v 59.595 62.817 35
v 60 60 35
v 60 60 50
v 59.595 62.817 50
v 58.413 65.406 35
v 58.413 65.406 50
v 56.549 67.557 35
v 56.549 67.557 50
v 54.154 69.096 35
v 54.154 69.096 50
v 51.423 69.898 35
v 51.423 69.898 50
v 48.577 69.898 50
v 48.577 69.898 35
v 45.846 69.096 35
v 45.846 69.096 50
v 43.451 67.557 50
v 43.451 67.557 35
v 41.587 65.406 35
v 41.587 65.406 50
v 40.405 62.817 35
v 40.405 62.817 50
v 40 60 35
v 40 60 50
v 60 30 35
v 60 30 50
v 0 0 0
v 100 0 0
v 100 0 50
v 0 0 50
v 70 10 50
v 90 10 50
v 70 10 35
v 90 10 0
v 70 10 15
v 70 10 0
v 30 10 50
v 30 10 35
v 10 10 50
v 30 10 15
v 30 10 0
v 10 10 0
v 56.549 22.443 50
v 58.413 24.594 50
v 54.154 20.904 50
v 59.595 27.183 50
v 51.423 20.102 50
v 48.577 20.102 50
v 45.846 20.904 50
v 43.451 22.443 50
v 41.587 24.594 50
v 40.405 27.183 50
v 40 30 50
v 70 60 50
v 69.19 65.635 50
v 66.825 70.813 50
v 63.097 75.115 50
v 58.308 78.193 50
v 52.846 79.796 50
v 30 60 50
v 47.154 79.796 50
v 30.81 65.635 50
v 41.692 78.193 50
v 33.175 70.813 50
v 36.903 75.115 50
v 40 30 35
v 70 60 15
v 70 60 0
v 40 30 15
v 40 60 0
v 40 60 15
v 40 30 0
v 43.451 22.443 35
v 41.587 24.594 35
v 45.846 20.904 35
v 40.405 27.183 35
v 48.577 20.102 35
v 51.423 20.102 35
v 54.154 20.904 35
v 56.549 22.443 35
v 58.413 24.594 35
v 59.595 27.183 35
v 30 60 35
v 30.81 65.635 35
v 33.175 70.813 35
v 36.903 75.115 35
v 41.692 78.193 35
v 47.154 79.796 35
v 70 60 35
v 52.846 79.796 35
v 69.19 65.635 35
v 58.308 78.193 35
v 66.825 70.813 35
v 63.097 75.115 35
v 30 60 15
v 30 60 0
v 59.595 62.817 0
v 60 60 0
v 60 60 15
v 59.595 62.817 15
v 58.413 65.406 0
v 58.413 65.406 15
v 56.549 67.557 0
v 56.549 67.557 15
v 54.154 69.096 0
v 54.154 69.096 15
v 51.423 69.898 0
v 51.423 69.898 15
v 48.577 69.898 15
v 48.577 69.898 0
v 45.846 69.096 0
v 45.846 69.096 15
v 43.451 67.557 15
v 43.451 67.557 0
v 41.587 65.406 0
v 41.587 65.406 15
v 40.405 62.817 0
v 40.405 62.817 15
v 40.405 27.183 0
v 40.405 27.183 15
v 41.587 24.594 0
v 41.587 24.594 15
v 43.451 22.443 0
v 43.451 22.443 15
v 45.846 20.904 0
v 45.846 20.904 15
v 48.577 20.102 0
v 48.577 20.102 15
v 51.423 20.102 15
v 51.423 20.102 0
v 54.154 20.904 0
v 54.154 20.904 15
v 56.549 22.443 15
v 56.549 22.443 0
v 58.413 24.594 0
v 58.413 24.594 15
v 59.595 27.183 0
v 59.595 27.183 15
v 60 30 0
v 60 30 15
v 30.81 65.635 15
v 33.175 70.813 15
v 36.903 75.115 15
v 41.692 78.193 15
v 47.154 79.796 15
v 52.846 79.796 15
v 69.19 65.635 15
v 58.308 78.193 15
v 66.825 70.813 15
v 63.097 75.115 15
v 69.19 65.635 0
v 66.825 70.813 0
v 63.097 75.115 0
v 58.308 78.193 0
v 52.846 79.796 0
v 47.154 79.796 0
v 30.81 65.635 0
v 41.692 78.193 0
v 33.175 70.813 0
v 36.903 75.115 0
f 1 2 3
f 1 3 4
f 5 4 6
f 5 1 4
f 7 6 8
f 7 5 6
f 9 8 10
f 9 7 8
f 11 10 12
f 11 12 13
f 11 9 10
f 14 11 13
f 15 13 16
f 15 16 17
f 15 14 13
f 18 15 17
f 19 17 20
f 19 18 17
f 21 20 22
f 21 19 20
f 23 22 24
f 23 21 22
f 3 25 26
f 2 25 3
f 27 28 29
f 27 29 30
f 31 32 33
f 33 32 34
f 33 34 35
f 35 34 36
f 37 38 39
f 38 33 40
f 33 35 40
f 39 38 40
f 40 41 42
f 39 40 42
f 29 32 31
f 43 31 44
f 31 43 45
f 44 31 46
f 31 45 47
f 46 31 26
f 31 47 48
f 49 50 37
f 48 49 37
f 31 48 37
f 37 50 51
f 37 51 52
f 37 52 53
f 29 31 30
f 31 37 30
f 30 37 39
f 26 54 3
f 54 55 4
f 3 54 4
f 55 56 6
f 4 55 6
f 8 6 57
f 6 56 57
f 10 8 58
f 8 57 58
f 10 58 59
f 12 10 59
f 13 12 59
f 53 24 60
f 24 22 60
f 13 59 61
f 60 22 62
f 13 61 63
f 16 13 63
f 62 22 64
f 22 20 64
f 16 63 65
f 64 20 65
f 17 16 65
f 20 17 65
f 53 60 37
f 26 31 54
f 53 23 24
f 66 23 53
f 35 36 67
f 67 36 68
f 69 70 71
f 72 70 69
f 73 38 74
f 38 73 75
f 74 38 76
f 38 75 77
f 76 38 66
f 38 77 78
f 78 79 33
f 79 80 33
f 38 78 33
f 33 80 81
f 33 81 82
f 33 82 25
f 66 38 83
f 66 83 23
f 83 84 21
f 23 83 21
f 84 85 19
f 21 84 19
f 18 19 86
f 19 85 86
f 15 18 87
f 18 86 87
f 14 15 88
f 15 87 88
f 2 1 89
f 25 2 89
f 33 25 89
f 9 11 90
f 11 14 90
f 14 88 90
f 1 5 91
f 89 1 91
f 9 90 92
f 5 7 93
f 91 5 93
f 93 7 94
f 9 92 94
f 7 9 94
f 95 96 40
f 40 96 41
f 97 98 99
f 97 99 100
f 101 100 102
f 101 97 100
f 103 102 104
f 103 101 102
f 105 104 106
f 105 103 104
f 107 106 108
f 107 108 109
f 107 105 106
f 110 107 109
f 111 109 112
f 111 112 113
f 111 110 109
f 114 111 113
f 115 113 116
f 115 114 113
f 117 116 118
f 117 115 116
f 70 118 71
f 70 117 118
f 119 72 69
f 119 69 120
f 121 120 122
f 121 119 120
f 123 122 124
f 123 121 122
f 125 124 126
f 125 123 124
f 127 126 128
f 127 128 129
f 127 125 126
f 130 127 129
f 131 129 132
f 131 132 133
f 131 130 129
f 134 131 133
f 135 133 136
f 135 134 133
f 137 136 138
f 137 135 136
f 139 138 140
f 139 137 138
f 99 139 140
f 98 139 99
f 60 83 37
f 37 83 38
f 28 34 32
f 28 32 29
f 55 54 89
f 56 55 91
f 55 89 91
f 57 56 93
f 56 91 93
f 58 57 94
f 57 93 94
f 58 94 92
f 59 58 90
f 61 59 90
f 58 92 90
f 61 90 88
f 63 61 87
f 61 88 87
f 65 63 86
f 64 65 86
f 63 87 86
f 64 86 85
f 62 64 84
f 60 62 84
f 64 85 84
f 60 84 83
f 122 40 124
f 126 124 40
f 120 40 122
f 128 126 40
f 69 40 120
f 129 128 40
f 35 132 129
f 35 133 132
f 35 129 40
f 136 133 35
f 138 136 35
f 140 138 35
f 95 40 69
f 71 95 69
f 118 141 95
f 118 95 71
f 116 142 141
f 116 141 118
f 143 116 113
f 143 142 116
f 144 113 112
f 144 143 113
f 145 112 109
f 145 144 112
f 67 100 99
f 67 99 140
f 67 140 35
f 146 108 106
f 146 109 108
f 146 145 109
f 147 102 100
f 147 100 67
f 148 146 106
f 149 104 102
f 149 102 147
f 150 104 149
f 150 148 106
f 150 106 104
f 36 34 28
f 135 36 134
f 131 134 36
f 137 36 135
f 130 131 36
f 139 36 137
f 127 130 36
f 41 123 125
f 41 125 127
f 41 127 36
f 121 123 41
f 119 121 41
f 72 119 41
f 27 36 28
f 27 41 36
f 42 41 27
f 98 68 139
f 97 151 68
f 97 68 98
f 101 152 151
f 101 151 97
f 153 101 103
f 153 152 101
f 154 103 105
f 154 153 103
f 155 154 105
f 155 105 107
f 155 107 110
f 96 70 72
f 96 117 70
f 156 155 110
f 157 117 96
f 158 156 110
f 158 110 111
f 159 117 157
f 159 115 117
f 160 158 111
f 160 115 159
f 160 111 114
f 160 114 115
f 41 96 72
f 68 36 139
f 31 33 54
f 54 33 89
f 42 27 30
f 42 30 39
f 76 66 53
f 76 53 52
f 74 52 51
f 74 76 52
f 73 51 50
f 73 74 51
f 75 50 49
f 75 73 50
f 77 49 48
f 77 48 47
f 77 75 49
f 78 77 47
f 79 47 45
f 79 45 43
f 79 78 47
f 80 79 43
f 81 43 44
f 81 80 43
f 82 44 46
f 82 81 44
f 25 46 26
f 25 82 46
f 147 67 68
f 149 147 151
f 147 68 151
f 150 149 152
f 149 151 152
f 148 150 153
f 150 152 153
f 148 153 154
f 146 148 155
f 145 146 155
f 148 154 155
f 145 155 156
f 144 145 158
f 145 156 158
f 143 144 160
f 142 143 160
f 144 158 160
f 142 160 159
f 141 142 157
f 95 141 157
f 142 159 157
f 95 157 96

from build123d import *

# Parameters (mm, degrees)
BOSS_EXTRUDE1_DEPTH = 50
BOSS_EXTRUDE2_DEPTH = 15
BOSS_EXTRUDE3_START = 35
BOSS_EXTRUDE3_DEPTH = 15


with BuildPart() as part:
    # Sketch1 → Boss-Extrude1 (new body)
    with BuildSketch(Plane.XY):
        Polygon((30, 10), (70, 10), (90, 10), (100, 0), (0, 0), (10, 10), align=None)
    extrude(amount=BOSS_EXTRUDE1_DEPTH)

    # Sketch1<3> → Boss-Extrude2 (add)
    with BuildSketch(Plane.XY):
        with BuildLine():
            Line((70, 10), (70, 60))
            ThreePointArc((70, 60), (50, 80), (30, 60))
            Line((30, 60), (30, 10))
            Line((30, 10), (70, 10))
        make_face()
        with BuildLine():
            ThreePointArc((40, 30), (50, 20), (60, 30))
            Line((60, 30), (60, 60))
            ThreePointArc((60, 60), (50, 70), (40, 60))
            Line((40, 60), (40, 30))
        make_face(mode=Mode.SUBTRACT)
    extrude(amount=BOSS_EXTRUDE2_DEPTH)

    # Sketch1<4> → Boss-Extrude3 (add)
    with BuildSketch(Plane.XY.offset(BOSS_EXTRUDE3_START)):
        with BuildLine():
            Line((70, 10), (70, 60))
            ThreePointArc((70, 60), (50, 80), (30, 60))
            Line((30, 60), (30, 10))
            Line((30, 10), (70, 10))
        make_face()
        with BuildLine():
            ThreePointArc((40, 30), (50, 20), (60, 30))
            Line((60, 30), (60, 60))
            ThreePointArc((60, 60), (50, 70), (40, 60))
            Line((40, 60), (40, 30))
        make_face(mode=Mode.SUBTRACT)
    extrude(amount=BOSS_EXTRUDE3_DEPTH)


solid = part.part
